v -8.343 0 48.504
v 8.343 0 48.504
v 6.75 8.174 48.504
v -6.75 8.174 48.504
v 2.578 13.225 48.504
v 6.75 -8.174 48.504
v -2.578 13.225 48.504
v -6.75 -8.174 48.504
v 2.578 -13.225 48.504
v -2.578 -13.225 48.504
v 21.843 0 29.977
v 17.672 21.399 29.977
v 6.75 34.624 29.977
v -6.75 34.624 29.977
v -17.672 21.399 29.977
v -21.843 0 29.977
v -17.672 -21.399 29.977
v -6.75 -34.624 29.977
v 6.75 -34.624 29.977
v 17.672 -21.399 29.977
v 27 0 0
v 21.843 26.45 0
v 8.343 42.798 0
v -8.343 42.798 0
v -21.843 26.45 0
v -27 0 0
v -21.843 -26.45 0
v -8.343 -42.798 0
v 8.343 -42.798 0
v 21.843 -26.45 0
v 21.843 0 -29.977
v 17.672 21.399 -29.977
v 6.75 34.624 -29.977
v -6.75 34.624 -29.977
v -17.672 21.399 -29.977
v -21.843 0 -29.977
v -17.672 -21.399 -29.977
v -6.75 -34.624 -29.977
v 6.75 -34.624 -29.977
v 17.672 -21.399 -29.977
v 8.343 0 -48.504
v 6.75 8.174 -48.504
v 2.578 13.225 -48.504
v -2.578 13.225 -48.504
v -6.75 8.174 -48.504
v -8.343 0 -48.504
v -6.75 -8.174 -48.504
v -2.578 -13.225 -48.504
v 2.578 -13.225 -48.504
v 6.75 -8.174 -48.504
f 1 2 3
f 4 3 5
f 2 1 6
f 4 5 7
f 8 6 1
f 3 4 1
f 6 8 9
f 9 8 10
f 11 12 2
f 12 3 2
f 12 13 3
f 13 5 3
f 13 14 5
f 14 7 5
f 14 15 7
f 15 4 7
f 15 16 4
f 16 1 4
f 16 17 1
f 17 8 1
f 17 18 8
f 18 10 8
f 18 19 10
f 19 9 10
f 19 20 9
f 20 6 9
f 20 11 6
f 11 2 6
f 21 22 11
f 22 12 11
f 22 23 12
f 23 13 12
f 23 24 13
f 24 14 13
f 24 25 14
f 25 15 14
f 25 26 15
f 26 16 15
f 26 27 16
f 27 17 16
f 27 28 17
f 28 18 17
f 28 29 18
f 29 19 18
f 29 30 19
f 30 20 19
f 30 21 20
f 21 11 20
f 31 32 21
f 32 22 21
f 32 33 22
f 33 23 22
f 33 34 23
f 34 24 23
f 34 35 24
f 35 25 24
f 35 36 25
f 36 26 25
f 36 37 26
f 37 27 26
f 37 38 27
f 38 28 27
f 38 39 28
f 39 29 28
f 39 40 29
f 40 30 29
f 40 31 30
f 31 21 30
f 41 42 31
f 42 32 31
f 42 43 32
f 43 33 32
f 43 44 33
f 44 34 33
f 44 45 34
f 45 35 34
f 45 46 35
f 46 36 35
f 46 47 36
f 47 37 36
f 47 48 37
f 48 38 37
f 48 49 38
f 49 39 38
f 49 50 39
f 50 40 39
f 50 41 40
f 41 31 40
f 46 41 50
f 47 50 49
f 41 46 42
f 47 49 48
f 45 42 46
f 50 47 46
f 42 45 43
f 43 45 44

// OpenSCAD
// Generated by SolidPython 1.0.1 on 2020-07-29 00:46:49


scale(v = [9, 15, 17]) {
	sphere(r = 3);
}
/***********************************************
*********      SolidPython code:      **********
************************************************
 
# import packages: SolidPython
from solid import *
from solid.utils import *
from itertools import chain, combinations, permutations


class Resize:

    def __init__(self, scad_file):
        self.scad_file = scad_file
        #self.scad_file = import_scad(scad_file)
        # cone/cylinder param:
        self.r1 = 0
        self.r2 = 0
        self.h = 0
        # rectangular prism param:
        self.w = 0
        self.l = 0
        # ellipse param:
        self.r = 0

    # import OpenScad code (file name corresponds to shape)


    # classify shape + parameters
    def assign(self, param1, param2, param3):
        if self.scad_file == 'cone.scad':
            self.r1 = param1
            self.r2 = param2
            self.h = param3
        elif self.scad_file == 'cylinder.scad':
            self.r1 = param1
            self.r2 = param2
            self.h = param3
        elif self.scad_file == 'rectangularPrism.scad':
            self.h = param1
            self.l = param2
            self.w = param3
        else:
            self.r = param1
            self.h = param2

    # resize parameters
    def iterate(self):
        x = range(3, 20, 2)
        i = 1
        if self.scad_file == 'cone.scad':
            tempList = list(permutations(x, 2))
            for temp in tempList:
                param1 = temp[0]
                param2 = temp[1]
                filepath = 'produced_scad_files/' + 'cone' + str(param1) + '_' + str(param2) + '_' + '.scad'
                scad_render_to_file(cylinder(h=param1, r1=param2, r2=0), filepath)

        elif self.scad_file == 'cylinder.scad':
            tempList = list(permutations(x, 3))
            for temp in tempList:
                param1 = temp[0]
                param2 = temp[1]
                filepath = 'produced_scad_files/' + 'cylinder' + str(param1) + '_' + str(param2) + '_' + '.scad'
                scad_render_to_file(cylinder(h=param1, r1=param2, r2=param2), filepath)

        elif self.scad_file == 'rectangularPrism.scad':
            tempList = list(permutations(x, 3))
            for temp in tempList:
                param1 = temp[0]
                param2 = temp[1]
                param3 = temp[2]
                filepath = 'produced_scad_files/' + 'rectangularPrism' + str(param1) + '_' + str(param2) + '_' + str(
                    param3) + '.scad'
                scad_render_to_file(cube(size=(param1, param2, param3)), filepath)

        elif self.scad_file == 'ellipse.scad':
            tempList = list(permutations(x, 4))
            for temp in tempList:
                param1 = temp[0]
                param2 = temp[1]
                param3 = temp[2]
                param4 = temp[3]
                filepath = 'produced_scad_files/' + 'ellipse' + str(param1) + '_' + str(param2) + '_' + str(param3) + '_' + str(param4) + '.scad'
                scad_render_to_file(scale([param1, param2, param3])(sphere(r=param4)), filepath)

    def render_to_scadfile(self):
        scad_render_to_file(scad, 'example.scad') 
 
************************************************/
